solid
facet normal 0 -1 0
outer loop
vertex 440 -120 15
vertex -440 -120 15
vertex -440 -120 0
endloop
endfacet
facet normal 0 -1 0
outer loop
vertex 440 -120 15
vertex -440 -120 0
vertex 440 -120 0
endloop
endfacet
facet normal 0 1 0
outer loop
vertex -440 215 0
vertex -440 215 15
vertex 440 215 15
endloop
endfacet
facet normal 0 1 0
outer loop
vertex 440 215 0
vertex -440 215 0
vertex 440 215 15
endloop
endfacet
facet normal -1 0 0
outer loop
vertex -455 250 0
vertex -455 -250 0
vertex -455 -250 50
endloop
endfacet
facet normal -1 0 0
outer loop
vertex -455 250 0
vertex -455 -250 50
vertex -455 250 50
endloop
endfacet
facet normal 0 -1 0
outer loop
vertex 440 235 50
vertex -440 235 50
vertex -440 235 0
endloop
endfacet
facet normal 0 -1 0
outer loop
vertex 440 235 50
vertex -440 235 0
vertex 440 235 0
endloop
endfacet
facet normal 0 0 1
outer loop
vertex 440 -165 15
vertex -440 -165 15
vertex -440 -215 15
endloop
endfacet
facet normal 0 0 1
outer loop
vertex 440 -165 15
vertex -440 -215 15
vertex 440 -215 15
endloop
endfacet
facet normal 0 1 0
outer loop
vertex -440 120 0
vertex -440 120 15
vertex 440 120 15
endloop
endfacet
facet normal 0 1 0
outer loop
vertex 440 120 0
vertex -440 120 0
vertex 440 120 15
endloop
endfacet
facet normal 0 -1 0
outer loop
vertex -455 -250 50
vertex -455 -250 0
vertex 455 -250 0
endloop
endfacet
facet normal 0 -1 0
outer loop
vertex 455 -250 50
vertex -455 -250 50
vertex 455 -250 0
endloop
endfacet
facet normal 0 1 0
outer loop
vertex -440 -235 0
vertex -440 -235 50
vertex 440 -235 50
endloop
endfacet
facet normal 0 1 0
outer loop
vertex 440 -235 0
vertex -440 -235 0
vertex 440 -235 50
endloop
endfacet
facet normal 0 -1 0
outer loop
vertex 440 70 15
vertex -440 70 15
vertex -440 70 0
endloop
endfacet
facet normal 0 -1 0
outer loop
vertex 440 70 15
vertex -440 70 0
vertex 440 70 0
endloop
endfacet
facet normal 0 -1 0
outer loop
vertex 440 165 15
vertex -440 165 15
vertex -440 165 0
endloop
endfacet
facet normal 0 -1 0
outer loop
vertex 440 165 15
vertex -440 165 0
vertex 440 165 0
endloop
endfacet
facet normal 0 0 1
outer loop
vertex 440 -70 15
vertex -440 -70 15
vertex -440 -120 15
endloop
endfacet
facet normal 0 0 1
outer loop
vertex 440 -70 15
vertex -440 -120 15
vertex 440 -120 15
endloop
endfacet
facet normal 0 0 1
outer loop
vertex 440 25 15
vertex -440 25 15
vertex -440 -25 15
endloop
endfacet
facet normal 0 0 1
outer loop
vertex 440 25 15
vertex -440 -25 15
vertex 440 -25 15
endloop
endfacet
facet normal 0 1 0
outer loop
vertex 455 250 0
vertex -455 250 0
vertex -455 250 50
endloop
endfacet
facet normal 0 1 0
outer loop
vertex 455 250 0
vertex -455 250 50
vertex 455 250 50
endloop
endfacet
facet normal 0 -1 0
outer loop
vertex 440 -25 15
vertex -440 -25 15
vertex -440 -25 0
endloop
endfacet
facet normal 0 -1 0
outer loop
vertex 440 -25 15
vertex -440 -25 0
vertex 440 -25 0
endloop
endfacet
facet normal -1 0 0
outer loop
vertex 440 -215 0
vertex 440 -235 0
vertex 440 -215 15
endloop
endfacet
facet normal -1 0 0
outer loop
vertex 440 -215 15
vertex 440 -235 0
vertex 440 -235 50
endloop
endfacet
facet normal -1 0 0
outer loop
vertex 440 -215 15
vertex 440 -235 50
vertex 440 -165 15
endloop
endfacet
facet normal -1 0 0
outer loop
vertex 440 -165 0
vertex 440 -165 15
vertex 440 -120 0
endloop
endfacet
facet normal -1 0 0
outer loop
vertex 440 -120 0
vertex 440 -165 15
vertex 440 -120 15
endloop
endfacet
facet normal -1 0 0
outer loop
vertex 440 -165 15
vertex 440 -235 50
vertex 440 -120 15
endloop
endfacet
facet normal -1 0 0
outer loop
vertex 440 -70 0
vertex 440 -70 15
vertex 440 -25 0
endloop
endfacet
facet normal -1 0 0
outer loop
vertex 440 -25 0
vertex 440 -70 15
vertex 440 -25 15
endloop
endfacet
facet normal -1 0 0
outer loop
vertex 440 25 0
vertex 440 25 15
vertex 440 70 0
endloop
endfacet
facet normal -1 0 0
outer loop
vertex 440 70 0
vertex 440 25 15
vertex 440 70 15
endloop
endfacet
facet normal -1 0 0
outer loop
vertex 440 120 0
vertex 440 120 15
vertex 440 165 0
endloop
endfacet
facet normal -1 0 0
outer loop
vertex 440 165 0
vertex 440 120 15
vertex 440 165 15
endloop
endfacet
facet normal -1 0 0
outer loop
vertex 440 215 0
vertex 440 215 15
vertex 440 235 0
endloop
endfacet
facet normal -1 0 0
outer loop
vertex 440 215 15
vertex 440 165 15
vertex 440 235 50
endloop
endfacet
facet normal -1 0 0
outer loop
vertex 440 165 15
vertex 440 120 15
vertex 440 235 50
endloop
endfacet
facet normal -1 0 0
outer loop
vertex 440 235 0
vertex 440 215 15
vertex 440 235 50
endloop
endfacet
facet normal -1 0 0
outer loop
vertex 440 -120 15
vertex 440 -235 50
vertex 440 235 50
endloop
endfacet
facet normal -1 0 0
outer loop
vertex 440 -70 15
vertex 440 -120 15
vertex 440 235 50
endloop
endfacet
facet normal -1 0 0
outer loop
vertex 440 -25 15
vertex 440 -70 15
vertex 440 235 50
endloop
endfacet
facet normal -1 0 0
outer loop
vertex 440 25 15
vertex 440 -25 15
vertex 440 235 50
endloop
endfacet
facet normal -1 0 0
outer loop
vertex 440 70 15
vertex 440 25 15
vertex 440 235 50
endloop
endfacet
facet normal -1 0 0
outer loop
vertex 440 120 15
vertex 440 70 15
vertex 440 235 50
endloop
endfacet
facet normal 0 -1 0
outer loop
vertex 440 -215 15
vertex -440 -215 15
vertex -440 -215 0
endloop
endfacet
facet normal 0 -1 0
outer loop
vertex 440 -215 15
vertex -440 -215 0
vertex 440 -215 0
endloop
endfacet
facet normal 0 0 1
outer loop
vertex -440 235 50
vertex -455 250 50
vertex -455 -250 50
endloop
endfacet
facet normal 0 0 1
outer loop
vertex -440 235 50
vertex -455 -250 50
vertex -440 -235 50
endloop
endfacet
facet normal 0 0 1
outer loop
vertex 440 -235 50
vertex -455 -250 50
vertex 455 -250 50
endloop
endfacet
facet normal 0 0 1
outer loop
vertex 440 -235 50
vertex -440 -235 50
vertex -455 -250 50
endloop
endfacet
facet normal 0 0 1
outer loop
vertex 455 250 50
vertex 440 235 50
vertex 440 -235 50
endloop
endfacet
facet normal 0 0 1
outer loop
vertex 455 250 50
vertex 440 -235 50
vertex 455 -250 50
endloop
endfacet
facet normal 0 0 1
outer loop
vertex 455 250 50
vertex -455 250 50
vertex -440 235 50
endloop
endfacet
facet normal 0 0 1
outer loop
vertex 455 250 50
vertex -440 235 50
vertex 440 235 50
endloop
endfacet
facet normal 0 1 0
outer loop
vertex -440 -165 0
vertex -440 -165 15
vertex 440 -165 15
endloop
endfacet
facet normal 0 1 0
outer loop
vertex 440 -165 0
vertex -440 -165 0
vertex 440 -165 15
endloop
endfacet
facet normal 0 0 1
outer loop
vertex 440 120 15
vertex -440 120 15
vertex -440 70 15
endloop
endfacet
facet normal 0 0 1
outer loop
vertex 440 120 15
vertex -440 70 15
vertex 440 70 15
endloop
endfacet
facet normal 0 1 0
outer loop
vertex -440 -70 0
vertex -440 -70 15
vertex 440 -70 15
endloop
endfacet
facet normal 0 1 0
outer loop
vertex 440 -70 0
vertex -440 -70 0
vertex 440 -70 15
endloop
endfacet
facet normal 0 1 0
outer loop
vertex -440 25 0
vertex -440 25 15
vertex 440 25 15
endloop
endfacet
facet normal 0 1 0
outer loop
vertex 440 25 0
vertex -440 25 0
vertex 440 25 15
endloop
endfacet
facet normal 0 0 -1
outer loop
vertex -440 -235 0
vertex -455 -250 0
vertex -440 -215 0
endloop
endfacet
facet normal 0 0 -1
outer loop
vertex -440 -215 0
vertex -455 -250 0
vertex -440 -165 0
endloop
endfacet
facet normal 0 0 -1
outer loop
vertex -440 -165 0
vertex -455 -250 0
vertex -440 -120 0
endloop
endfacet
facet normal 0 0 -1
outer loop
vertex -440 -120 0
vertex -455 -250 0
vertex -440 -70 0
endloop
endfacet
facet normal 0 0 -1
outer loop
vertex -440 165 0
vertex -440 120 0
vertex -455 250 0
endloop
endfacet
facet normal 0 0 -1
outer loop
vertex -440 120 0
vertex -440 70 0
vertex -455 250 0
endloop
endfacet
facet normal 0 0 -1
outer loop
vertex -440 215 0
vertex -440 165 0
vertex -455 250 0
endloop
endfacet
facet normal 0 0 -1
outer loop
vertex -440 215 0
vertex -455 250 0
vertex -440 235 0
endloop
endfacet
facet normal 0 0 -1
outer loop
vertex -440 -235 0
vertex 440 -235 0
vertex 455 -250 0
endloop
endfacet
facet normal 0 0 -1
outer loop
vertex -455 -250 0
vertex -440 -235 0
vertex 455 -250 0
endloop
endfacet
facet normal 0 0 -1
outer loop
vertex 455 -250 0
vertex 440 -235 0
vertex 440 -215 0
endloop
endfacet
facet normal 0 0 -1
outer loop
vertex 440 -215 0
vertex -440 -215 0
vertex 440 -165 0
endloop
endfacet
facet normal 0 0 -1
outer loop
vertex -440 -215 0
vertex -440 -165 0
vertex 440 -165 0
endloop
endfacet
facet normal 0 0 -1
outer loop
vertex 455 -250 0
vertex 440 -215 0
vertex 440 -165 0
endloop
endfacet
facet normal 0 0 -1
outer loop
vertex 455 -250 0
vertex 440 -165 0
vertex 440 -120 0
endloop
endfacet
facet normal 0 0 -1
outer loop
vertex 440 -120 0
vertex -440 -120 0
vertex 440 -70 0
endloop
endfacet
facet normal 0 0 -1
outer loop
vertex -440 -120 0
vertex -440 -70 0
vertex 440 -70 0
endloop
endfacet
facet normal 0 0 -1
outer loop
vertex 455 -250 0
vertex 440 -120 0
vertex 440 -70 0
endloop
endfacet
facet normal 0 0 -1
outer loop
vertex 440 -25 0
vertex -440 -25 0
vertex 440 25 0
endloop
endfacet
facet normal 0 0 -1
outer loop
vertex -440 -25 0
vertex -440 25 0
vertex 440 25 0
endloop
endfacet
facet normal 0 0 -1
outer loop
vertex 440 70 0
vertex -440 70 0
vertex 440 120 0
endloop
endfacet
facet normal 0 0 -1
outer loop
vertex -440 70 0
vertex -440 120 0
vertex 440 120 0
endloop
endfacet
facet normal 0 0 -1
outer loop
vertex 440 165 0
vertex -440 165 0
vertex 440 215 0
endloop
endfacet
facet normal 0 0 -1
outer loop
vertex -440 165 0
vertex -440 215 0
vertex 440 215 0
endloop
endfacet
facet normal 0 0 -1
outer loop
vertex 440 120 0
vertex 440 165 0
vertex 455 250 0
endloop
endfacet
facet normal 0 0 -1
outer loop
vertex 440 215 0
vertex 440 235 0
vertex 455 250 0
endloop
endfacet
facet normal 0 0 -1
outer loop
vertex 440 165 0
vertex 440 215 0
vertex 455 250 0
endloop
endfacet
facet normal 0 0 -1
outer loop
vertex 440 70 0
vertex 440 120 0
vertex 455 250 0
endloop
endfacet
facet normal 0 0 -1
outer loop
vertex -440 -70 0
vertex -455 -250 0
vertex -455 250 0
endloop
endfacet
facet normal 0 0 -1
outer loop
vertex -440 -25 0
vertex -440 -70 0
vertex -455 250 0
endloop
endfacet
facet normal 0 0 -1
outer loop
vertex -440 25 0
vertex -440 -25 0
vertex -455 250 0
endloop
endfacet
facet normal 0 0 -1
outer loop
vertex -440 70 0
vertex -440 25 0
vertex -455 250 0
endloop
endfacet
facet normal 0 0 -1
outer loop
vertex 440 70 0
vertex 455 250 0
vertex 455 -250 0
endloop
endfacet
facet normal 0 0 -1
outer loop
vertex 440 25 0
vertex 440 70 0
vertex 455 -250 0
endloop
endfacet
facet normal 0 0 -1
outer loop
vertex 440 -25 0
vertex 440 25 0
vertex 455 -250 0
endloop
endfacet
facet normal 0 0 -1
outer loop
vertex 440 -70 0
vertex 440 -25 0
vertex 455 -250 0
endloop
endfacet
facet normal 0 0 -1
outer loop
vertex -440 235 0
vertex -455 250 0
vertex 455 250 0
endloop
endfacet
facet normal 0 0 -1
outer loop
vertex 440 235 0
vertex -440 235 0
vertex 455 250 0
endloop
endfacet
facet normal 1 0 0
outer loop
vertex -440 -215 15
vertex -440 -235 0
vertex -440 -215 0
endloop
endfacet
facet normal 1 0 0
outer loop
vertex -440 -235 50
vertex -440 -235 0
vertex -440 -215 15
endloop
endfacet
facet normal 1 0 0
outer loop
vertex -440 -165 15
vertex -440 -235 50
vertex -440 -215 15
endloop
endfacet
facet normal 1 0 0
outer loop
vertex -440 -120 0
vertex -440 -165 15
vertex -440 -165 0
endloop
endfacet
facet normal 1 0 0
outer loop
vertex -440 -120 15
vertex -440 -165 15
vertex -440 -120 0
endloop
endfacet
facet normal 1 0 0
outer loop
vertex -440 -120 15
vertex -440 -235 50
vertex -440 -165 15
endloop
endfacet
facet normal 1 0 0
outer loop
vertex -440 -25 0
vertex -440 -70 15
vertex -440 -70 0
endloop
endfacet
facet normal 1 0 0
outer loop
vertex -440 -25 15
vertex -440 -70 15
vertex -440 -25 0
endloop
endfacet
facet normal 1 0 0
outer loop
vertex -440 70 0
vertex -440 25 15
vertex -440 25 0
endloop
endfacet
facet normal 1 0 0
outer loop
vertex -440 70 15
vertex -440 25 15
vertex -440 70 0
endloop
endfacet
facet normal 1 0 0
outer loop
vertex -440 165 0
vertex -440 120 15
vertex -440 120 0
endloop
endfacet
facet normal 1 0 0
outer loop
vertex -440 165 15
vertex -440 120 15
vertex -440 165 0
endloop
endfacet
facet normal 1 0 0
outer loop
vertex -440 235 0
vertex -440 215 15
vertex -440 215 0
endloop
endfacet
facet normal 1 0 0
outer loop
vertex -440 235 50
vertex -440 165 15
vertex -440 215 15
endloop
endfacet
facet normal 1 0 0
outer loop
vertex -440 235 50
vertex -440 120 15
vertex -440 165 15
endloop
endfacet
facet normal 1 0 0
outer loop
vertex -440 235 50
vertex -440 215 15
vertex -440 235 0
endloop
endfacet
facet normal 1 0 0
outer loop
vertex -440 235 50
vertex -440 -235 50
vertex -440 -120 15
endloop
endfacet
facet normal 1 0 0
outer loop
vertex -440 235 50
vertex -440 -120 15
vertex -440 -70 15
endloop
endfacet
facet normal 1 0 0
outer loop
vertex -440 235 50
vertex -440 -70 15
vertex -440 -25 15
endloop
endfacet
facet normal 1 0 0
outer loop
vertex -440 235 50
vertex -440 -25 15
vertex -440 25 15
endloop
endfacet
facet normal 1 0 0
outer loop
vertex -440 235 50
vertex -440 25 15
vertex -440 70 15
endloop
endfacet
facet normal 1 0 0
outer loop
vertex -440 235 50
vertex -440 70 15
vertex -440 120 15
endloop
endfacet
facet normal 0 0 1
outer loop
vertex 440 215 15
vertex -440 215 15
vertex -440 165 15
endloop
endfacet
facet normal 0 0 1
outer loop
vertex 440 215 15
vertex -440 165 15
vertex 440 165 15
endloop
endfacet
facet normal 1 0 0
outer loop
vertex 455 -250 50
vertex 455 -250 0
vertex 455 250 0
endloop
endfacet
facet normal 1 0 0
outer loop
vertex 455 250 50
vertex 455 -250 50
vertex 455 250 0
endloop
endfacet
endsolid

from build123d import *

# Parameters (mm, degrees)
F0_W     = 910
F0_H     = 500
F0_W_2   = 880
F0_H_2   = 470
F1_DEPTH = 50
F2_DEPTH = 15
F3_W     = 880
F3_H     = 45
F3_H_2   = 20
F4_DEPTH = 15


with BuildPart() as f1:
    # F0 (on Top) → F1 (new body)
    with BuildSketch(Plane.XY):
        Rectangle(F0_W, F0_H)
        Rectangle(F0_W_2, F0_H_2, mode=Mode.SUBTRACT)
    extrude(amount=F1_DEPTH)

    # F0 (on Top) → F2 (join)
    with BuildSketch(Plane.XY):
        Rectangle(F0_W_2, F0_H_2)
    extrude(amount=F2_DEPTH)

    # F3 (on face) → F4 (cut, through all)
    with BuildSketch(Plane.XY.offset(15)):
        with Locations((0, 142.5)):
            Rectangle(F3_W, F3_H)
        with Locations((0, 47.5)):
            Rectangle(F3_W, F3_H)
        with Locations((0, -47.5)):
            Rectangle(F3_W, F3_H)
        with Locations((0, -142.5)):
            Rectangle(F3_W, F3_H)
        with Locations((0, 225)):
            Rectangle(F3_W, F3_H_2)
        with Locations((0, -225)):
            Rectangle(F3_W, F3_H_2)
    extrude(amount=-F4_DEPTH, mode=Mode.SUBTRACT)


solid = f1.part
